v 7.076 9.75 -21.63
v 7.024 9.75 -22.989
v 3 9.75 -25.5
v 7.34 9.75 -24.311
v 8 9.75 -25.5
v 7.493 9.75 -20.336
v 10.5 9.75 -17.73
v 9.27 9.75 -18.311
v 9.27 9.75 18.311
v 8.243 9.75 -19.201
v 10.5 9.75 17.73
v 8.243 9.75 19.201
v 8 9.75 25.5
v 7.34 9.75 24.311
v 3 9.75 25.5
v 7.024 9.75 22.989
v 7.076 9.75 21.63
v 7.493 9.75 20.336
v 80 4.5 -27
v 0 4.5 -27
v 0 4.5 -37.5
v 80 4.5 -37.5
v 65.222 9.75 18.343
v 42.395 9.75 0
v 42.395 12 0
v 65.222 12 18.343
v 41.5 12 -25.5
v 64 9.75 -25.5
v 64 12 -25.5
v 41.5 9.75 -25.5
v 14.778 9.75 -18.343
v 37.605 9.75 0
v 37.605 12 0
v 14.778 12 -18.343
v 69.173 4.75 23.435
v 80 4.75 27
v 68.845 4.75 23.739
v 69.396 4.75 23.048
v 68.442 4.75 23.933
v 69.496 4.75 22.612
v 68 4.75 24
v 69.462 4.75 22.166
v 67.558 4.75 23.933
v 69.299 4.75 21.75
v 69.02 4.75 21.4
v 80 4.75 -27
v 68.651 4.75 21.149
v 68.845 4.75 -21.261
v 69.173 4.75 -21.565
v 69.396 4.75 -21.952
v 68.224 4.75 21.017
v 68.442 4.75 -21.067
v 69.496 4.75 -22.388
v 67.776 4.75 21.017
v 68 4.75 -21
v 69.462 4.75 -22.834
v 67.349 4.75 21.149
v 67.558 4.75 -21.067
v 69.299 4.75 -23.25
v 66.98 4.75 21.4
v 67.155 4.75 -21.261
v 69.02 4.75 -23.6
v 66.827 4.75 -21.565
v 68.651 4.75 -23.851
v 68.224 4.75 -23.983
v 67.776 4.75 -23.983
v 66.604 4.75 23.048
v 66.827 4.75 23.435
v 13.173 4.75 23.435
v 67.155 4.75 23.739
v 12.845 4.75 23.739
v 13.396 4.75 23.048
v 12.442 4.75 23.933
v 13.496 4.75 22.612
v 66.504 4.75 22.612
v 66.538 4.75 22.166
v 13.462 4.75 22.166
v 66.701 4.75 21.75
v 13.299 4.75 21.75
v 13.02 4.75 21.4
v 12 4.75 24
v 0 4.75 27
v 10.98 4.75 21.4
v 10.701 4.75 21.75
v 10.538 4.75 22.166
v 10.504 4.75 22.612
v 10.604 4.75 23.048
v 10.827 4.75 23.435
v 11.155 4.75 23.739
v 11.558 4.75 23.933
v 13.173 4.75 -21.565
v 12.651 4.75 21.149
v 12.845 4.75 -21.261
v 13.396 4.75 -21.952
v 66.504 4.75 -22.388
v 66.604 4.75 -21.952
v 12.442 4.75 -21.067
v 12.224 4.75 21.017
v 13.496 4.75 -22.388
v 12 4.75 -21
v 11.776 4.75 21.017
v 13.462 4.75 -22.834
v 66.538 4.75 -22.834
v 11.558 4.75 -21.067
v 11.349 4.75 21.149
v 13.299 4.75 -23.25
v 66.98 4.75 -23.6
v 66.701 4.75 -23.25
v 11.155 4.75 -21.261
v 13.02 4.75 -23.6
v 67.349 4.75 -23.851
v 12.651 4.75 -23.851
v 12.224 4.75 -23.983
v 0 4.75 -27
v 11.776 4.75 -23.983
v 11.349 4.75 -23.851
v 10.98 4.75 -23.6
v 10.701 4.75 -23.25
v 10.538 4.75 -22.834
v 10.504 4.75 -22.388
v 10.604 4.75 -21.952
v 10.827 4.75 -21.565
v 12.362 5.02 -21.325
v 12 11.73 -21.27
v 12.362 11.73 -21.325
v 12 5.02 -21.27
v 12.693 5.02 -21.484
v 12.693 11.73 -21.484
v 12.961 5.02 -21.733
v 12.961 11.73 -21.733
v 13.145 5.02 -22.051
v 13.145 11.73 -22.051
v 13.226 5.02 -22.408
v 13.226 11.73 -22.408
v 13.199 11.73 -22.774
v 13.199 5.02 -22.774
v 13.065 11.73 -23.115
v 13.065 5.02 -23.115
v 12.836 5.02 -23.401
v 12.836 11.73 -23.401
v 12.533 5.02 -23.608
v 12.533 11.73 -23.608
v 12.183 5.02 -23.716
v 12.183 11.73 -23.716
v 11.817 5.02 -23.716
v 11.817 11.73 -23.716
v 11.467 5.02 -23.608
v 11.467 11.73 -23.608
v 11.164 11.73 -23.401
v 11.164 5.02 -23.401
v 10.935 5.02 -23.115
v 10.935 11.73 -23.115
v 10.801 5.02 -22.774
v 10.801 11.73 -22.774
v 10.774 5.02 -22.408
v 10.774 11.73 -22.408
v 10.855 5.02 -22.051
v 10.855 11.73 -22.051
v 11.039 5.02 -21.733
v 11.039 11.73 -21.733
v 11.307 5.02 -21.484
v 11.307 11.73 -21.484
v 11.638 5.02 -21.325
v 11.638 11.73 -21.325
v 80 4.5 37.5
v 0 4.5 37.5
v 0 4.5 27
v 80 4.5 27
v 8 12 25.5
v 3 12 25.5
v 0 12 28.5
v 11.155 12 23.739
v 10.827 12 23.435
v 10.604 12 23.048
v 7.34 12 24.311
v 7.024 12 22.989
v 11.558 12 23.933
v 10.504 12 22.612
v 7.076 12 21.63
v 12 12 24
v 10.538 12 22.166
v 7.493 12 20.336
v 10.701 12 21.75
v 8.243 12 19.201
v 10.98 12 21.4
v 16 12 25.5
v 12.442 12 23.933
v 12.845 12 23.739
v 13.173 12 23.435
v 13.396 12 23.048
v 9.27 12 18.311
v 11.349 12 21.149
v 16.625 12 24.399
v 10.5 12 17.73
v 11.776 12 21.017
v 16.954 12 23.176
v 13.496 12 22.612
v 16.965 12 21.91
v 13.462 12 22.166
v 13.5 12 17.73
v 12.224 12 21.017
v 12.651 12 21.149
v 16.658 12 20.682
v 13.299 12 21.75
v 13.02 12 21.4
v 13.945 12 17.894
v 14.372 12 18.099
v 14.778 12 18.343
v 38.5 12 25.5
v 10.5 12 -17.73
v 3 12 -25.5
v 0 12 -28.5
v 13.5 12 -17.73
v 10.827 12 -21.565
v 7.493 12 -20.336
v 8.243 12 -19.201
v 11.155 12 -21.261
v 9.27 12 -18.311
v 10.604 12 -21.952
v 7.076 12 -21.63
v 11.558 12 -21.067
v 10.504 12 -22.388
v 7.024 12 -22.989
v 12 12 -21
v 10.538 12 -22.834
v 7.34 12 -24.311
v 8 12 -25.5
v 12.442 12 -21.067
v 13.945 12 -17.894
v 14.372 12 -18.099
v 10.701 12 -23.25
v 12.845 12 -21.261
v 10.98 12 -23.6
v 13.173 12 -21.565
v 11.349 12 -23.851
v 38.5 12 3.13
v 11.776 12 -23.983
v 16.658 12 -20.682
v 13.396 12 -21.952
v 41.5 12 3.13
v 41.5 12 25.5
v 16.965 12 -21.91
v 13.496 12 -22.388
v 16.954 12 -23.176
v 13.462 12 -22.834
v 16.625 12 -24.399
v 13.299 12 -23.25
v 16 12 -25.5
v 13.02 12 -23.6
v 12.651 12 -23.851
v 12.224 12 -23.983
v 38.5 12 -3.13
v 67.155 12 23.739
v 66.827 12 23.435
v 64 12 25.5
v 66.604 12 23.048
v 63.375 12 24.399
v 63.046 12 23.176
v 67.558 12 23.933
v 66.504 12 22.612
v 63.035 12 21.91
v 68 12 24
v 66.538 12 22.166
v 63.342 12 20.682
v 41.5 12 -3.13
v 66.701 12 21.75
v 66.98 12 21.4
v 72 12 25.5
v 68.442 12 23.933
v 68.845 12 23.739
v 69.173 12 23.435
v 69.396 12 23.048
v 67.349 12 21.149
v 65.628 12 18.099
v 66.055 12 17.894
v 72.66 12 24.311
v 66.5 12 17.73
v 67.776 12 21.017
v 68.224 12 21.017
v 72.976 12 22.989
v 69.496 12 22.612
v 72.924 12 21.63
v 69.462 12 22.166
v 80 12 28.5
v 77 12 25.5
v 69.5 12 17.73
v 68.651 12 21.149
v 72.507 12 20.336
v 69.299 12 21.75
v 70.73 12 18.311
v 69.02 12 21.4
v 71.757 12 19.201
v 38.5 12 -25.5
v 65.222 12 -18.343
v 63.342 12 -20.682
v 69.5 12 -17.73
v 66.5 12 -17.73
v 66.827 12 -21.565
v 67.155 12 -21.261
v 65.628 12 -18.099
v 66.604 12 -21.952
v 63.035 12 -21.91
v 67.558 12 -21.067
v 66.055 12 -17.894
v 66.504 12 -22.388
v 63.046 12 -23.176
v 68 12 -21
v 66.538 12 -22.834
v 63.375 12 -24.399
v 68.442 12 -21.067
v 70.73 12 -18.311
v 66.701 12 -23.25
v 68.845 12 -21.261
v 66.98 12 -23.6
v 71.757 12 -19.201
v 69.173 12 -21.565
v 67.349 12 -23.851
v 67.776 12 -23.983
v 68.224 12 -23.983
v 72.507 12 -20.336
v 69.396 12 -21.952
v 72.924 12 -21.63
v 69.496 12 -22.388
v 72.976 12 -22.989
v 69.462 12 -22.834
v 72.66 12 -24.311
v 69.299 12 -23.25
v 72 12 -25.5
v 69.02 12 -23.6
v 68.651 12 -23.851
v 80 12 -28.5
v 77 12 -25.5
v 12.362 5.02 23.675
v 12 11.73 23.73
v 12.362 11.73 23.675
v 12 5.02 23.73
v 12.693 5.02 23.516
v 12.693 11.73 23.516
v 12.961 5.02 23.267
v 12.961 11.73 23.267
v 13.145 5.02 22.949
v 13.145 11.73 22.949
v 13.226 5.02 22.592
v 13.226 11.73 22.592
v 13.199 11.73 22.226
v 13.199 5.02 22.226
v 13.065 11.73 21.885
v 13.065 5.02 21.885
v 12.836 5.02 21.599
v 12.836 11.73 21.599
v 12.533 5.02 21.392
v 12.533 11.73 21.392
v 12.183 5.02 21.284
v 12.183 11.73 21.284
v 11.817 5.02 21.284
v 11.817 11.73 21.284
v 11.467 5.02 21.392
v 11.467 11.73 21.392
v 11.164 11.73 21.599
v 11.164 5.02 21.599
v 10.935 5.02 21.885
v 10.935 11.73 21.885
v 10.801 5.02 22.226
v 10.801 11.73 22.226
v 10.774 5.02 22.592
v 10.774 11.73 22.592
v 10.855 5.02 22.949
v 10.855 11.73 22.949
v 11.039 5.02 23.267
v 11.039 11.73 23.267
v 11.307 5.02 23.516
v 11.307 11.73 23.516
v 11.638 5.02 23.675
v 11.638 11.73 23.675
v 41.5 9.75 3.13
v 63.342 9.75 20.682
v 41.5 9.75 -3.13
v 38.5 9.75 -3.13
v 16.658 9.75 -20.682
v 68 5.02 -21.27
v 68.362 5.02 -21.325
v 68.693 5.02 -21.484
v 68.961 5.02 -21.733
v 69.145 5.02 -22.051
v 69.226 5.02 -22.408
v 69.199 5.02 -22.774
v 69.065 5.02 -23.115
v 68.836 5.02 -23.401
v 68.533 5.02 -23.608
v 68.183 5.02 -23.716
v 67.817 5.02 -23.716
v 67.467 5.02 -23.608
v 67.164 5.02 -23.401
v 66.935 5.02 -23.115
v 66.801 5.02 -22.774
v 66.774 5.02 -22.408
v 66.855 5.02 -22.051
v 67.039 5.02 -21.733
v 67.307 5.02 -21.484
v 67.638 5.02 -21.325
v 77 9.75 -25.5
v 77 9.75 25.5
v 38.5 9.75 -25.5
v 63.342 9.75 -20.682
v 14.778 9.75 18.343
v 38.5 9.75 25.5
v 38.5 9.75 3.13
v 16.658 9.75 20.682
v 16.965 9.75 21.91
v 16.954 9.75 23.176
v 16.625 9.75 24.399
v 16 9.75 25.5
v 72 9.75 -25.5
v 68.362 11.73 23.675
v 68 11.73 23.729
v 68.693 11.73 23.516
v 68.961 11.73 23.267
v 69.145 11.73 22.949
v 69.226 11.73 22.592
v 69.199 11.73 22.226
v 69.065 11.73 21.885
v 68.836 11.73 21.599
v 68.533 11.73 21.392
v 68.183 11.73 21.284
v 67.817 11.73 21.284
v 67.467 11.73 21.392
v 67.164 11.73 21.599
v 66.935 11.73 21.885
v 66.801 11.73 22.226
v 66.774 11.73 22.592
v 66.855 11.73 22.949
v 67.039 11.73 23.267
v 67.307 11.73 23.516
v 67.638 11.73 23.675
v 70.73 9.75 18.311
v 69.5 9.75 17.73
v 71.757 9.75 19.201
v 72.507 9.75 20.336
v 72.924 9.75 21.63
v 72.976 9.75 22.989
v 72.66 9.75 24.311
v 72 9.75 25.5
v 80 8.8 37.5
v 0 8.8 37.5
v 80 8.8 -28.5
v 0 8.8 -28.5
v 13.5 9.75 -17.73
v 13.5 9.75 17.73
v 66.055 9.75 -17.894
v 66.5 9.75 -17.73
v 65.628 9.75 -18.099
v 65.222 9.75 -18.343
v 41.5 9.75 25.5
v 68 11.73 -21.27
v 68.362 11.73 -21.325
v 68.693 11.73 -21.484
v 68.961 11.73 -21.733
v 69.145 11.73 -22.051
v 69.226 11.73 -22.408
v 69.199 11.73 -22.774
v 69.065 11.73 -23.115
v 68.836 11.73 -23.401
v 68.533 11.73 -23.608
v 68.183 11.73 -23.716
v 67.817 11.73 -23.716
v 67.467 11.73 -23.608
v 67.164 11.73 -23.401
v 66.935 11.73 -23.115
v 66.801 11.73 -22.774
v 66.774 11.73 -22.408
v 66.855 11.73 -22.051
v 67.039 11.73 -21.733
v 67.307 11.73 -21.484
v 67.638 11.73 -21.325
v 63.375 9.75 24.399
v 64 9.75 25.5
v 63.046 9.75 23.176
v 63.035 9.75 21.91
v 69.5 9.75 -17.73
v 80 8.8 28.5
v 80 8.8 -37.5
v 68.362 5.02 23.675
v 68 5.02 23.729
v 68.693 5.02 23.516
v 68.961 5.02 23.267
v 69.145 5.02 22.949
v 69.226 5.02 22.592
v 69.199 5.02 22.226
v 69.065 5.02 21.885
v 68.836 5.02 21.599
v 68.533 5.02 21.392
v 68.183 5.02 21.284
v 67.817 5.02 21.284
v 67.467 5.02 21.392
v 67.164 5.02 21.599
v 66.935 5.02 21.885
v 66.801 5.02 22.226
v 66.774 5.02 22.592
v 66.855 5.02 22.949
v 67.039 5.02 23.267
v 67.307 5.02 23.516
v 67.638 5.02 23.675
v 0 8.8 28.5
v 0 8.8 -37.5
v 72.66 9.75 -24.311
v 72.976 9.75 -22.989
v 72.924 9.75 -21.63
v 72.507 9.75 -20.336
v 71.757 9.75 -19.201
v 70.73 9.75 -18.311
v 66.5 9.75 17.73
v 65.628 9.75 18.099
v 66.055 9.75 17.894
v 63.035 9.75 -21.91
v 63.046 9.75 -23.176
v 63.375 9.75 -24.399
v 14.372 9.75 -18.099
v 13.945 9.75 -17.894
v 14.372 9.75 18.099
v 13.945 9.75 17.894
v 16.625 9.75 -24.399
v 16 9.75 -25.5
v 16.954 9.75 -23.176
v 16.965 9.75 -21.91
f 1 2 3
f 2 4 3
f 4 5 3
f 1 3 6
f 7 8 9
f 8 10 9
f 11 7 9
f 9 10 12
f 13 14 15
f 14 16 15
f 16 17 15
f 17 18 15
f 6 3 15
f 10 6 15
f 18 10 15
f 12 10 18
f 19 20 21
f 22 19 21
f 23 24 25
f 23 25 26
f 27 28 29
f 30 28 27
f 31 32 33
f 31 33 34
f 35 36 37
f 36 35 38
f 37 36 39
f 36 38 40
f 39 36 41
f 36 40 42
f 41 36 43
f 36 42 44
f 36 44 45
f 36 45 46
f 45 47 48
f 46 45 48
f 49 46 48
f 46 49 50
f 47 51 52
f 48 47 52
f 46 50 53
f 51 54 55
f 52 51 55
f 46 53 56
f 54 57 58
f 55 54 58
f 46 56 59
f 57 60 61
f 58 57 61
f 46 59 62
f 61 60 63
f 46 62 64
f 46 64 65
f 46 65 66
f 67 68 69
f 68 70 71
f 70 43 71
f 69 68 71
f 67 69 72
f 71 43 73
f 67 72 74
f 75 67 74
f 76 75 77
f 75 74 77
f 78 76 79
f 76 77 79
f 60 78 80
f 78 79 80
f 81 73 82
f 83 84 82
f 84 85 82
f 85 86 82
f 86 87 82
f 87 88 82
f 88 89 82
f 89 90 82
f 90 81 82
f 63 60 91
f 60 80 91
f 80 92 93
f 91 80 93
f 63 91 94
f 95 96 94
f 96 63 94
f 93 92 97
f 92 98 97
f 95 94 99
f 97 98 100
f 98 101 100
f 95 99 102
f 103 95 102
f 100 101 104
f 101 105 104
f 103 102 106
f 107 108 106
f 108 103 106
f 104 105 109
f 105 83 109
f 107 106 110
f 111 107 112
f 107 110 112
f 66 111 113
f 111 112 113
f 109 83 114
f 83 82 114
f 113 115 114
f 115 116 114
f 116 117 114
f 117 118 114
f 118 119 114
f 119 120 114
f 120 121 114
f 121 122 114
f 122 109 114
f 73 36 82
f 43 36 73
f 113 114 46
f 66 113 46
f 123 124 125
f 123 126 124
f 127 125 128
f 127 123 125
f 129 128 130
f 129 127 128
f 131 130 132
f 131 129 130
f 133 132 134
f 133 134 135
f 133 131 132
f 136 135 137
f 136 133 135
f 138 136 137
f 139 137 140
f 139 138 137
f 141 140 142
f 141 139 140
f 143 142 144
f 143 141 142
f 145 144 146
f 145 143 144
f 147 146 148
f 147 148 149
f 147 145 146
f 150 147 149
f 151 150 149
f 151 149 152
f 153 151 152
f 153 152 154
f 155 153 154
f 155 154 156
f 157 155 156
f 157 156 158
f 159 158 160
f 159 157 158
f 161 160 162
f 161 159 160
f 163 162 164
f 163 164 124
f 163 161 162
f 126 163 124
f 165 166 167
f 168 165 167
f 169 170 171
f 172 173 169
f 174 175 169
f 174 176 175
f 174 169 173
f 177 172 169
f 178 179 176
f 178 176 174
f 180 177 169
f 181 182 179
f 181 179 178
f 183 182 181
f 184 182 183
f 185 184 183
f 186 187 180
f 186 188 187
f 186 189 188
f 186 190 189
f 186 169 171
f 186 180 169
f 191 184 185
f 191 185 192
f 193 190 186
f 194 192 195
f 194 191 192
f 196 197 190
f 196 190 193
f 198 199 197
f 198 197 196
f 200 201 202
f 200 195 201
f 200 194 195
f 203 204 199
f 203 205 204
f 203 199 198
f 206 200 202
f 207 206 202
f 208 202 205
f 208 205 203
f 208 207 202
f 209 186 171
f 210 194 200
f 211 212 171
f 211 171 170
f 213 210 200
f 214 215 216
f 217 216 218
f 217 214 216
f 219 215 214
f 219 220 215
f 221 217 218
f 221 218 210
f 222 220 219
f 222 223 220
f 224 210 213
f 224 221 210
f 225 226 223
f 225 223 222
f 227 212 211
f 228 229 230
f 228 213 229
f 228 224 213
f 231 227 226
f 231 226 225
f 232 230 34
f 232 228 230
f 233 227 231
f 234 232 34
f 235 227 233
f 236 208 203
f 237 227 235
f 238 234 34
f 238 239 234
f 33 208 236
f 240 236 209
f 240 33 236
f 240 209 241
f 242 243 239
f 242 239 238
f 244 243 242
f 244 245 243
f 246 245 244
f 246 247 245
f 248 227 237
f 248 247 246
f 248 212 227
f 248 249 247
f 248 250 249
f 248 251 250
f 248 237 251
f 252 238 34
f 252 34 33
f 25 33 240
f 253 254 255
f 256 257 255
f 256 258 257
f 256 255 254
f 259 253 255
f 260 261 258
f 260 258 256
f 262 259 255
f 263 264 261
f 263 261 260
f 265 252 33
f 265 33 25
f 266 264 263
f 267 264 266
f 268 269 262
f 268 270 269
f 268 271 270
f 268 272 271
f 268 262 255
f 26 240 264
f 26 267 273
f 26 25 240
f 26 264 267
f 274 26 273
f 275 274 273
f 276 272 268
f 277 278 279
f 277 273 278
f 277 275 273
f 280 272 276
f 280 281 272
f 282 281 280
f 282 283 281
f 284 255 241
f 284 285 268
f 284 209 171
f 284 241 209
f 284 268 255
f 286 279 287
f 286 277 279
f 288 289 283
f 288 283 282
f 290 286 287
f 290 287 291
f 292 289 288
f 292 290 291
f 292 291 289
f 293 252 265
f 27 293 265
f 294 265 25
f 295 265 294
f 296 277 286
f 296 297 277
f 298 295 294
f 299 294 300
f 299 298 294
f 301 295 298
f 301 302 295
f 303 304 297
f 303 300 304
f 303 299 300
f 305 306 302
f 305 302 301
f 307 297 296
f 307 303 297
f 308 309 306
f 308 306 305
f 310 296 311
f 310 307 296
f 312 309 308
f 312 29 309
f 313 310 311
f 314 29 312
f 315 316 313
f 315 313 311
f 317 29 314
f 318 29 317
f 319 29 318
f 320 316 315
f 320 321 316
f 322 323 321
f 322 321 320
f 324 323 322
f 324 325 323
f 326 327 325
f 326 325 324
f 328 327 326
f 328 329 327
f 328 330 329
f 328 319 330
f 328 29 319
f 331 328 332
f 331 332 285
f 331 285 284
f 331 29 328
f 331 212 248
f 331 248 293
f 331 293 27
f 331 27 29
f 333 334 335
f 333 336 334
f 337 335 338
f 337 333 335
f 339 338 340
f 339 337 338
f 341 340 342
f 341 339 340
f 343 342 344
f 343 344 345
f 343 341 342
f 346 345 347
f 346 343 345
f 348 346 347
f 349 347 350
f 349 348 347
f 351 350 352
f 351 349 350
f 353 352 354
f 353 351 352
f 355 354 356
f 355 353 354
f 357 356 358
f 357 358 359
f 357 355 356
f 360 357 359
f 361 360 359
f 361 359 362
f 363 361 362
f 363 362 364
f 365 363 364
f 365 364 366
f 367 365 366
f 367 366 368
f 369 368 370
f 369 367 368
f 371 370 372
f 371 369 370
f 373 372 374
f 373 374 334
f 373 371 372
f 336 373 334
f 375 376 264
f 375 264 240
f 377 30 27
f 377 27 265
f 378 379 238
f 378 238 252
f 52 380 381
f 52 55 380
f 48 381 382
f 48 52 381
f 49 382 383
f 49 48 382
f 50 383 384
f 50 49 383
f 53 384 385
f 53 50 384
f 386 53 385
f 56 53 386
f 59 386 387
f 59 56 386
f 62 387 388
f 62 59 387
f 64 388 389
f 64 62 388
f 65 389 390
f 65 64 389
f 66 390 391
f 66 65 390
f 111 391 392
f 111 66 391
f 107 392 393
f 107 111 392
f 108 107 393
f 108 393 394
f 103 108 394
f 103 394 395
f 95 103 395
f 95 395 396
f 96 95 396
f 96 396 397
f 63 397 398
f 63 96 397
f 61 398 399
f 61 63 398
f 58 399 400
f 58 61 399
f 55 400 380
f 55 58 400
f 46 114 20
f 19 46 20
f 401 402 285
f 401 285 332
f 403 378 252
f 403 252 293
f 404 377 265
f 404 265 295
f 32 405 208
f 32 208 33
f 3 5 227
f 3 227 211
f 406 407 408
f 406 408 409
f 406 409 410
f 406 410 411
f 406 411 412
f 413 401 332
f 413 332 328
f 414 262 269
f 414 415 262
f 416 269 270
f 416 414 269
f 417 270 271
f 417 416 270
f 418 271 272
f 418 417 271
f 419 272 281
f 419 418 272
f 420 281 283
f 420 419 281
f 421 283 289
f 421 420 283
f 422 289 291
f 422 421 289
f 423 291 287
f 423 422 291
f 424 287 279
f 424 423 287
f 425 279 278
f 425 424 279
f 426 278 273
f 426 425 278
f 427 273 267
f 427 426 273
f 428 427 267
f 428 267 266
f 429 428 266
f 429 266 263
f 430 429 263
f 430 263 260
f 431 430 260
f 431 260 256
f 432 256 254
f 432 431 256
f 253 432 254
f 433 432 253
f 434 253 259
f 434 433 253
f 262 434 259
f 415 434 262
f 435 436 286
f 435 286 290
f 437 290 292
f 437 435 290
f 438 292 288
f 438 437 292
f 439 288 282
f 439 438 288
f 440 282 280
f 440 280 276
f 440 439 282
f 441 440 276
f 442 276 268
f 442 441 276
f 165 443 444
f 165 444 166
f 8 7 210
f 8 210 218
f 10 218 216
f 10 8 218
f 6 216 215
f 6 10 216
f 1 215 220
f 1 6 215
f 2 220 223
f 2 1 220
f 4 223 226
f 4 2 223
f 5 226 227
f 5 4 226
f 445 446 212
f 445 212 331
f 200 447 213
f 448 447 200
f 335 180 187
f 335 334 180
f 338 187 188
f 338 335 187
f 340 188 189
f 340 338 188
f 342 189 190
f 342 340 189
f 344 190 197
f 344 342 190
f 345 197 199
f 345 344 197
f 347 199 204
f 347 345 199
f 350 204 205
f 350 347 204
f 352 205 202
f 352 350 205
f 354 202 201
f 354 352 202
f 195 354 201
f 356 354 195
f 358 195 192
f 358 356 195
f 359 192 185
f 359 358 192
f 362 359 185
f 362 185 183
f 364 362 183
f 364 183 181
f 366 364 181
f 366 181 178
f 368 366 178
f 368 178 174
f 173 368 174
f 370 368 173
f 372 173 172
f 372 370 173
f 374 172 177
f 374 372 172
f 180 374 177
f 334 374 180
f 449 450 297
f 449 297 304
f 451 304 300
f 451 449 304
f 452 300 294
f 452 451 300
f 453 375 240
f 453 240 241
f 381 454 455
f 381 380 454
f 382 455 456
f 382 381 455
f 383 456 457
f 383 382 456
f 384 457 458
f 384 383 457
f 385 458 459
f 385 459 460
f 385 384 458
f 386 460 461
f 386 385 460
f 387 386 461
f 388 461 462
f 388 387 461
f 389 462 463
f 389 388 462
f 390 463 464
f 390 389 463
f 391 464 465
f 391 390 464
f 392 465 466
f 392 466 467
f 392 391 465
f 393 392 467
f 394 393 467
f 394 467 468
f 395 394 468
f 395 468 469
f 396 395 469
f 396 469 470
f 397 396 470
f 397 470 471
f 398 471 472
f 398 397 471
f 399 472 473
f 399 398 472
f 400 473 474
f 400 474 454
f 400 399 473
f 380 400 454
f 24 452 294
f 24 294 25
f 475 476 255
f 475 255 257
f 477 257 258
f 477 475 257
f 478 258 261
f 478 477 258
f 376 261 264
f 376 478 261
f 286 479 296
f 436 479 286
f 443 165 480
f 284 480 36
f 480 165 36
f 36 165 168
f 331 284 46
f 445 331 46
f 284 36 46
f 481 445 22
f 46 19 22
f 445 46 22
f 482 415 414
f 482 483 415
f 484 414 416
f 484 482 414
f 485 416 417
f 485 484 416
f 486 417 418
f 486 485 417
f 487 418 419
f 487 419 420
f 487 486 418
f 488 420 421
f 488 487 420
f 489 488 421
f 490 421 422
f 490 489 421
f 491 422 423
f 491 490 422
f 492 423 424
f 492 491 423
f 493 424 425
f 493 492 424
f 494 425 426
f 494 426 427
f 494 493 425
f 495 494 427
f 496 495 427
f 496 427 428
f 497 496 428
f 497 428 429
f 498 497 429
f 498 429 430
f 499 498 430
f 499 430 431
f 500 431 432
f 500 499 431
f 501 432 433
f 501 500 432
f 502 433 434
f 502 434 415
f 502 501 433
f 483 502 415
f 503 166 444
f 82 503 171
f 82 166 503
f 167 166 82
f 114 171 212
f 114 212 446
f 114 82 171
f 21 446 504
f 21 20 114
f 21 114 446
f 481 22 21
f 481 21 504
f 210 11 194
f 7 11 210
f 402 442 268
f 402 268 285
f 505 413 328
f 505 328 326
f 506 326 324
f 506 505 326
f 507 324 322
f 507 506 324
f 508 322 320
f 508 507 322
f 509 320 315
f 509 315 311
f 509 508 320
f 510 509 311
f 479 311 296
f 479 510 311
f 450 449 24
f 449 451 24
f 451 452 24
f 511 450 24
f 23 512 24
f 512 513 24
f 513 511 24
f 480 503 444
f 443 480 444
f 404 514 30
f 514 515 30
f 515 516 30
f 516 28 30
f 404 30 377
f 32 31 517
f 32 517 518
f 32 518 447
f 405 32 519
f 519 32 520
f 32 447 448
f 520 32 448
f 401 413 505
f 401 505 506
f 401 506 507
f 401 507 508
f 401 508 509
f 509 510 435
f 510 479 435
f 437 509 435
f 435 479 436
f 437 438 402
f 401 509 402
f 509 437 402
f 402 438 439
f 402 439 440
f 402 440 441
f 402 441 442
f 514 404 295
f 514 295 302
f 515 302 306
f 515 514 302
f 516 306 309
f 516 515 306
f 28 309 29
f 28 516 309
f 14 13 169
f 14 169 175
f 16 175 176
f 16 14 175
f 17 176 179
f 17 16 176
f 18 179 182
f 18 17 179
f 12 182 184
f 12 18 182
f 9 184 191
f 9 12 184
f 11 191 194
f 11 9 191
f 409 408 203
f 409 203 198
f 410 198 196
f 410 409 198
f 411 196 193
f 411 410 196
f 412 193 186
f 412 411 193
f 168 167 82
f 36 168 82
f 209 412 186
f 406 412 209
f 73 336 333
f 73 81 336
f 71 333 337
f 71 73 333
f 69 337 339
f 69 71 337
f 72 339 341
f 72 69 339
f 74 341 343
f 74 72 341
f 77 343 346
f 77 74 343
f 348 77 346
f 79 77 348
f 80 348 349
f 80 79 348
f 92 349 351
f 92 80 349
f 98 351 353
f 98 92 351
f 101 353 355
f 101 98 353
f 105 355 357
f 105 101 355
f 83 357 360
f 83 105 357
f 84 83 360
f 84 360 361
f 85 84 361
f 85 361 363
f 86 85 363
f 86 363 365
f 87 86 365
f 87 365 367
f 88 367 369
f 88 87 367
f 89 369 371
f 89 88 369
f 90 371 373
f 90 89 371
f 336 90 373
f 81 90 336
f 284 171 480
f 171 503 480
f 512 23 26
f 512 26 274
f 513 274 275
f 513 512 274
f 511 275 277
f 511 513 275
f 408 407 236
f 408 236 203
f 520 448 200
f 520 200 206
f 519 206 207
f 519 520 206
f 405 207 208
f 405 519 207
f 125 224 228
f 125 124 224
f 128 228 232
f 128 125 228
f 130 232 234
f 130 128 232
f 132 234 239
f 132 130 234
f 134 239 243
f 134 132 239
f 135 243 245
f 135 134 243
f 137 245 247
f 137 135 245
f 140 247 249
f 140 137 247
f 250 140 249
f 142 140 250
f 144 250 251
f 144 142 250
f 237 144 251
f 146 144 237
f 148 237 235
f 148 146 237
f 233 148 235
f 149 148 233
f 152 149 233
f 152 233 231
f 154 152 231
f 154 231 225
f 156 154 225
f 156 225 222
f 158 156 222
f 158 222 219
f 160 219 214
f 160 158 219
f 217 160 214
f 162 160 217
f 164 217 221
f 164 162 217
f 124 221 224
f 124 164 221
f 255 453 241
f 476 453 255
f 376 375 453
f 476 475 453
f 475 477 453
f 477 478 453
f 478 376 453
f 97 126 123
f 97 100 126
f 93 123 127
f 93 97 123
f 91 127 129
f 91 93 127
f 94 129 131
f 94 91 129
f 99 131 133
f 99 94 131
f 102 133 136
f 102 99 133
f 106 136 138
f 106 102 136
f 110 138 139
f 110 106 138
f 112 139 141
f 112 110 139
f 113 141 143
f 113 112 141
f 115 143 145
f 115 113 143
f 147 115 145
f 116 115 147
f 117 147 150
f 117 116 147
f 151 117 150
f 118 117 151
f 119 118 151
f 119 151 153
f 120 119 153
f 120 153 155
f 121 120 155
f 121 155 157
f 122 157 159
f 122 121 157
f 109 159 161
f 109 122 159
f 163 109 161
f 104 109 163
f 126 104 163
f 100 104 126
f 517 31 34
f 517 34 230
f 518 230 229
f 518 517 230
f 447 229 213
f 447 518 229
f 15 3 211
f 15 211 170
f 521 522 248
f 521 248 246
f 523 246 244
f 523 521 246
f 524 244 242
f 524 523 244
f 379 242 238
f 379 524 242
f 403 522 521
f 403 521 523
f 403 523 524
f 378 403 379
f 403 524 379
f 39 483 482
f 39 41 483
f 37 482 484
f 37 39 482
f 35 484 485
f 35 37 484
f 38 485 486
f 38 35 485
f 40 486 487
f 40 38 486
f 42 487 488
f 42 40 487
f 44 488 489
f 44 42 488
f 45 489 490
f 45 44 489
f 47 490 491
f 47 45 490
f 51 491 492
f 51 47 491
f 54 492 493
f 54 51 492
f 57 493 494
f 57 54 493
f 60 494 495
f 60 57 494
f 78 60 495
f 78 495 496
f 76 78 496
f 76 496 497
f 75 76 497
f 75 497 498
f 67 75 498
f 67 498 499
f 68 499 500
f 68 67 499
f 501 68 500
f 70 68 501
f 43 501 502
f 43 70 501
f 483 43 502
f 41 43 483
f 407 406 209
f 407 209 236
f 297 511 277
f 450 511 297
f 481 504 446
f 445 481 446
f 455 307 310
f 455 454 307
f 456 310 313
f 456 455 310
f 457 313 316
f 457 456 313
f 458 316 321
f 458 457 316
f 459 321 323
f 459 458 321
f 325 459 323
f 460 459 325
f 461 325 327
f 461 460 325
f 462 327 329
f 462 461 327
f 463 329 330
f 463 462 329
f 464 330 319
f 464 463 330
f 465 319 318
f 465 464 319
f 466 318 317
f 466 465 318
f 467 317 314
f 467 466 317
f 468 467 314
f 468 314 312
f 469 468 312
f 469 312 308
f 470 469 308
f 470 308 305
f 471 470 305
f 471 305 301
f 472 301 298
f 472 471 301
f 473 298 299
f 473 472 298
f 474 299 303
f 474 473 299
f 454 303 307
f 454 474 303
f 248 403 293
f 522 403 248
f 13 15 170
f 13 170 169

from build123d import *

# Parameters (mm, degrees)
BOSS_EXTRUDE1_DEPTH = 80
SKETCH2_W           = 80
SKETCH2_H           = 57
BOSS_EXTRUDE2_DEPTH = 2.25


with BuildPart() as part:
    # Sketch1 → Boss-Extrude1 (new body)
    with BuildSketch(Plane(origin=(0, 0, 0), x_dir=(0, 0, -1), z_dir=(1, 0, 0))):
        Polygon((-37.5, 4.5), (-27, 4.5), (-27, 4.75), (27, 4.75), (27, 4.5), (37.5, 4.5), (37.5, 8.8), (28.5, 8.8), (28.5, 9.75), (-28.5, 9.75), (-28.5, 8.8), (-37.5, 8.8), align=None)
    extrude(amount=BOSS_EXTRUDE1_DEPTH)

    # Sketch2 → Boss-Extrude2 (add)
    with BuildSketch(Plane(origin=(0, 9.75, 0), x_dir=(1, 0, 0), z_dir=(0, 1, 0))):
        with Locations((40, 0)):
            Rectangle(SKETCH2_W, SKETCH2_H)
        with BuildLine():
            Line((69.5, 17.730303993), (69.5, -17.730303993))
            ThreePointArc((69.5, -17.730303993), (72.759678982, -20.968511838), (72, -25.5))
            Line((72, -25.5), (77, -25.5))
            Line((77, -25.5), (77, 25.5))
            Line((77, 25.5), (72, 25.5))
            ThreePointArc((72, 25.5), (72.759678982, 20.968511838), (69.5, 17.730303993))
        make_face(mode=Mode.SUBTRACT)
        with BuildLine():
            Line((42.394670007, 0), (65.221566009, -18.34304143))
            ThreePointArc((65.221566009, -18.34304143), (65.838956006, -17.991132198), (66.5, -17.730303993))
            Line((66.5, -17.730303993), (66.5, 17.730303993))
            ThreePointArc((66.5, 17.730303993), (65.838956006, 17.991132198), (65.221566009, 18.34304143))
            Line((65.221566009, 18.34304143), (42.394670007, 0))
        make_face(mode=Mode.SUBTRACT)
        with BuildLine():
            Line((41.5, 25.5), (41.5, 3.129645542))
            Line((41.5, 3.129645542), (63.342392684, 20.681568234))
            ThreePointArc((63.342392684, 20.681568234), (63.045924679, 23.176119604), (64, 25.5))
            Line((64, 25.5), (41.5, 25.5))
        make_face(mode=Mode.SUBTRACT)
        with BuildLine():
            Line((41.5, -25.5), (64, -25.5))
            ThreePointArc((64, -25.5), (63.045924679, -23.176119604), (63.342392684, -20.681568234))
            Line((63.342392684, -20.681568234), (41.5, -3.129645542))
            Line((41.5, -3.129645542), (41.5, -25.5))
        make_face(mode=Mode.SUBTRACT)
        with BuildLine():
            Line((16.657607316, 20.681568234), (38.5, 3.129645542))
            Line((38.5, 3.129645542), (38.5, 25.5))
            Line((38.5, 25.5), (16, 25.5))
            ThreePointArc((16, 25.5), (16.954075321, 23.176119604), (16.657607316, 20.681568234))
        make_face(mode=Mode.SUBTRACT)
        with BuildLine():
            Line((16, -25.5), (38.5, -25.5))
            Line((38.5, -25.5), (38.5, -3.129645542))
            Line((38.5, -3.129645542), (16.657607316, -20.681568234))
            ThreePointArc((16.657607316, -20.681568234), (16.954075321, -23.176119604), (16, -25.5))
        make_face(mode=Mode.SUBTRACT)
        with BuildLine():
            Line((14.778433991, -18.34304143), (37.605329993, 0))
            Line((37.605329993, 0), (14.778433991, 18.34304143))
            ThreePointArc((14.778433991, 18.34304143), (14.161043994, 17.991132198), (13.5, 17.730303993))
            Line((13.5, 17.730303993), (13.5, -17.730303993))
            ThreePointArc((13.5, -17.730303993), (14.161043994, -17.991132198), (14.778433991, -18.34304143))
        make_face(mode=Mode.SUBTRACT)
        with BuildLine():
            Line((3, -25.5), (8, -25.5))
            ThreePointArc((8, -25.5), (7.240321018, -20.968511838), (10.5, -17.730303993))
            Line((10.5, -17.730303993), (10.5, 17.730303993))
            ThreePointArc((10.5, 17.730303993), (7.240321018, 20.968511838), (8, 25.5))
            Line((8, 25.5), (3, 25.5))
            Line((3, 25.5), (3, -25.5))
        make_face(mode=Mode.SUBTRACT)
    extrude(amount=BOSS_EXTRUDE2_DEPTH)

    # Sketch3 → Cut-Revolve1 (revolve, cut)
    with BuildSketch(Plane.XY.offset(22.5), mode=Mode.PRIVATE) as cut_revolve1_sk:
        Polygon((12, 12), (13.5, 12), (13.2295, 11.7295), (13.2295, 5.0205), (13.5, 4.75), (12, 4.75), align=None)
    revolve(cut_revolve1_sk.sketch.rotate(Axis((12, 4.75, 22.5), (0, 1, 0)), 270), axis=Axis((12, 4.75, 22.5), (0, 1, 0)), mode=Mode.SUBTRACT)

    # Sketch4 → Cut-Revolve2 (revolve, cut)
    with BuildSketch(Plane.XY.offset(22.5), mode=Mode.PRIVATE) as cut_revolve2_sk:
        Polygon((68, 12), (69.5, 12), (69.2295, 11.7295), (69.2295, 5.0205), (69.5, 4.75), (68, 4.75), align=None)
    revolve(cut_revolve2_sk.sketch.rotate(Axis((68, 4.75, 22.5), (0, 1, 0)), 270), axis=Axis((68, 4.75, 22.5), (0, 1, 0)), mode=Mode.SUBTRACT)

    # Sketch5 → Cut-Revolve3 (revolve, cut)
    with BuildSketch(Plane.XY.offset(-22.5), mode=Mode.PRIVATE) as cut_revolve3_sk:
        Polygon((12, 12), (13.5, 12), (13.2295, 11.7295), (13.2295, 5.0205), (13.5, 4.75), (12, 4.75), align=None)
    revolve(cut_revolve3_sk.sketch.rotate(Axis((12, 4.75, -22.5), (0, 1, 0)), 270), axis=Axis((12, 4.75, -22.5), (0, 1, 0)), mode=Mode.SUBTRACT)

    # Sketch6 → Cut-Revolve4 (revolve, cut)
    with BuildSketch(Plane.XY.offset(-22.5), mode=Mode.PRIVATE) as cut_revolve4_sk:
        Polygon((68, 12), (69.5, 12), (69.2295, 11.7295), (69.2295, 5.0205), (69.5, 4.75), (68, 4.75), align=None)
    revolve(cut_revolve4_sk.sketch.rotate(Axis((68, 4.75, -22.5), (0, 1, 0)), 270), axis=Axis((68, 4.75, -22.5), (0, 1, 0)), mode=Mode.SUBTRACT)


solid = part.part
